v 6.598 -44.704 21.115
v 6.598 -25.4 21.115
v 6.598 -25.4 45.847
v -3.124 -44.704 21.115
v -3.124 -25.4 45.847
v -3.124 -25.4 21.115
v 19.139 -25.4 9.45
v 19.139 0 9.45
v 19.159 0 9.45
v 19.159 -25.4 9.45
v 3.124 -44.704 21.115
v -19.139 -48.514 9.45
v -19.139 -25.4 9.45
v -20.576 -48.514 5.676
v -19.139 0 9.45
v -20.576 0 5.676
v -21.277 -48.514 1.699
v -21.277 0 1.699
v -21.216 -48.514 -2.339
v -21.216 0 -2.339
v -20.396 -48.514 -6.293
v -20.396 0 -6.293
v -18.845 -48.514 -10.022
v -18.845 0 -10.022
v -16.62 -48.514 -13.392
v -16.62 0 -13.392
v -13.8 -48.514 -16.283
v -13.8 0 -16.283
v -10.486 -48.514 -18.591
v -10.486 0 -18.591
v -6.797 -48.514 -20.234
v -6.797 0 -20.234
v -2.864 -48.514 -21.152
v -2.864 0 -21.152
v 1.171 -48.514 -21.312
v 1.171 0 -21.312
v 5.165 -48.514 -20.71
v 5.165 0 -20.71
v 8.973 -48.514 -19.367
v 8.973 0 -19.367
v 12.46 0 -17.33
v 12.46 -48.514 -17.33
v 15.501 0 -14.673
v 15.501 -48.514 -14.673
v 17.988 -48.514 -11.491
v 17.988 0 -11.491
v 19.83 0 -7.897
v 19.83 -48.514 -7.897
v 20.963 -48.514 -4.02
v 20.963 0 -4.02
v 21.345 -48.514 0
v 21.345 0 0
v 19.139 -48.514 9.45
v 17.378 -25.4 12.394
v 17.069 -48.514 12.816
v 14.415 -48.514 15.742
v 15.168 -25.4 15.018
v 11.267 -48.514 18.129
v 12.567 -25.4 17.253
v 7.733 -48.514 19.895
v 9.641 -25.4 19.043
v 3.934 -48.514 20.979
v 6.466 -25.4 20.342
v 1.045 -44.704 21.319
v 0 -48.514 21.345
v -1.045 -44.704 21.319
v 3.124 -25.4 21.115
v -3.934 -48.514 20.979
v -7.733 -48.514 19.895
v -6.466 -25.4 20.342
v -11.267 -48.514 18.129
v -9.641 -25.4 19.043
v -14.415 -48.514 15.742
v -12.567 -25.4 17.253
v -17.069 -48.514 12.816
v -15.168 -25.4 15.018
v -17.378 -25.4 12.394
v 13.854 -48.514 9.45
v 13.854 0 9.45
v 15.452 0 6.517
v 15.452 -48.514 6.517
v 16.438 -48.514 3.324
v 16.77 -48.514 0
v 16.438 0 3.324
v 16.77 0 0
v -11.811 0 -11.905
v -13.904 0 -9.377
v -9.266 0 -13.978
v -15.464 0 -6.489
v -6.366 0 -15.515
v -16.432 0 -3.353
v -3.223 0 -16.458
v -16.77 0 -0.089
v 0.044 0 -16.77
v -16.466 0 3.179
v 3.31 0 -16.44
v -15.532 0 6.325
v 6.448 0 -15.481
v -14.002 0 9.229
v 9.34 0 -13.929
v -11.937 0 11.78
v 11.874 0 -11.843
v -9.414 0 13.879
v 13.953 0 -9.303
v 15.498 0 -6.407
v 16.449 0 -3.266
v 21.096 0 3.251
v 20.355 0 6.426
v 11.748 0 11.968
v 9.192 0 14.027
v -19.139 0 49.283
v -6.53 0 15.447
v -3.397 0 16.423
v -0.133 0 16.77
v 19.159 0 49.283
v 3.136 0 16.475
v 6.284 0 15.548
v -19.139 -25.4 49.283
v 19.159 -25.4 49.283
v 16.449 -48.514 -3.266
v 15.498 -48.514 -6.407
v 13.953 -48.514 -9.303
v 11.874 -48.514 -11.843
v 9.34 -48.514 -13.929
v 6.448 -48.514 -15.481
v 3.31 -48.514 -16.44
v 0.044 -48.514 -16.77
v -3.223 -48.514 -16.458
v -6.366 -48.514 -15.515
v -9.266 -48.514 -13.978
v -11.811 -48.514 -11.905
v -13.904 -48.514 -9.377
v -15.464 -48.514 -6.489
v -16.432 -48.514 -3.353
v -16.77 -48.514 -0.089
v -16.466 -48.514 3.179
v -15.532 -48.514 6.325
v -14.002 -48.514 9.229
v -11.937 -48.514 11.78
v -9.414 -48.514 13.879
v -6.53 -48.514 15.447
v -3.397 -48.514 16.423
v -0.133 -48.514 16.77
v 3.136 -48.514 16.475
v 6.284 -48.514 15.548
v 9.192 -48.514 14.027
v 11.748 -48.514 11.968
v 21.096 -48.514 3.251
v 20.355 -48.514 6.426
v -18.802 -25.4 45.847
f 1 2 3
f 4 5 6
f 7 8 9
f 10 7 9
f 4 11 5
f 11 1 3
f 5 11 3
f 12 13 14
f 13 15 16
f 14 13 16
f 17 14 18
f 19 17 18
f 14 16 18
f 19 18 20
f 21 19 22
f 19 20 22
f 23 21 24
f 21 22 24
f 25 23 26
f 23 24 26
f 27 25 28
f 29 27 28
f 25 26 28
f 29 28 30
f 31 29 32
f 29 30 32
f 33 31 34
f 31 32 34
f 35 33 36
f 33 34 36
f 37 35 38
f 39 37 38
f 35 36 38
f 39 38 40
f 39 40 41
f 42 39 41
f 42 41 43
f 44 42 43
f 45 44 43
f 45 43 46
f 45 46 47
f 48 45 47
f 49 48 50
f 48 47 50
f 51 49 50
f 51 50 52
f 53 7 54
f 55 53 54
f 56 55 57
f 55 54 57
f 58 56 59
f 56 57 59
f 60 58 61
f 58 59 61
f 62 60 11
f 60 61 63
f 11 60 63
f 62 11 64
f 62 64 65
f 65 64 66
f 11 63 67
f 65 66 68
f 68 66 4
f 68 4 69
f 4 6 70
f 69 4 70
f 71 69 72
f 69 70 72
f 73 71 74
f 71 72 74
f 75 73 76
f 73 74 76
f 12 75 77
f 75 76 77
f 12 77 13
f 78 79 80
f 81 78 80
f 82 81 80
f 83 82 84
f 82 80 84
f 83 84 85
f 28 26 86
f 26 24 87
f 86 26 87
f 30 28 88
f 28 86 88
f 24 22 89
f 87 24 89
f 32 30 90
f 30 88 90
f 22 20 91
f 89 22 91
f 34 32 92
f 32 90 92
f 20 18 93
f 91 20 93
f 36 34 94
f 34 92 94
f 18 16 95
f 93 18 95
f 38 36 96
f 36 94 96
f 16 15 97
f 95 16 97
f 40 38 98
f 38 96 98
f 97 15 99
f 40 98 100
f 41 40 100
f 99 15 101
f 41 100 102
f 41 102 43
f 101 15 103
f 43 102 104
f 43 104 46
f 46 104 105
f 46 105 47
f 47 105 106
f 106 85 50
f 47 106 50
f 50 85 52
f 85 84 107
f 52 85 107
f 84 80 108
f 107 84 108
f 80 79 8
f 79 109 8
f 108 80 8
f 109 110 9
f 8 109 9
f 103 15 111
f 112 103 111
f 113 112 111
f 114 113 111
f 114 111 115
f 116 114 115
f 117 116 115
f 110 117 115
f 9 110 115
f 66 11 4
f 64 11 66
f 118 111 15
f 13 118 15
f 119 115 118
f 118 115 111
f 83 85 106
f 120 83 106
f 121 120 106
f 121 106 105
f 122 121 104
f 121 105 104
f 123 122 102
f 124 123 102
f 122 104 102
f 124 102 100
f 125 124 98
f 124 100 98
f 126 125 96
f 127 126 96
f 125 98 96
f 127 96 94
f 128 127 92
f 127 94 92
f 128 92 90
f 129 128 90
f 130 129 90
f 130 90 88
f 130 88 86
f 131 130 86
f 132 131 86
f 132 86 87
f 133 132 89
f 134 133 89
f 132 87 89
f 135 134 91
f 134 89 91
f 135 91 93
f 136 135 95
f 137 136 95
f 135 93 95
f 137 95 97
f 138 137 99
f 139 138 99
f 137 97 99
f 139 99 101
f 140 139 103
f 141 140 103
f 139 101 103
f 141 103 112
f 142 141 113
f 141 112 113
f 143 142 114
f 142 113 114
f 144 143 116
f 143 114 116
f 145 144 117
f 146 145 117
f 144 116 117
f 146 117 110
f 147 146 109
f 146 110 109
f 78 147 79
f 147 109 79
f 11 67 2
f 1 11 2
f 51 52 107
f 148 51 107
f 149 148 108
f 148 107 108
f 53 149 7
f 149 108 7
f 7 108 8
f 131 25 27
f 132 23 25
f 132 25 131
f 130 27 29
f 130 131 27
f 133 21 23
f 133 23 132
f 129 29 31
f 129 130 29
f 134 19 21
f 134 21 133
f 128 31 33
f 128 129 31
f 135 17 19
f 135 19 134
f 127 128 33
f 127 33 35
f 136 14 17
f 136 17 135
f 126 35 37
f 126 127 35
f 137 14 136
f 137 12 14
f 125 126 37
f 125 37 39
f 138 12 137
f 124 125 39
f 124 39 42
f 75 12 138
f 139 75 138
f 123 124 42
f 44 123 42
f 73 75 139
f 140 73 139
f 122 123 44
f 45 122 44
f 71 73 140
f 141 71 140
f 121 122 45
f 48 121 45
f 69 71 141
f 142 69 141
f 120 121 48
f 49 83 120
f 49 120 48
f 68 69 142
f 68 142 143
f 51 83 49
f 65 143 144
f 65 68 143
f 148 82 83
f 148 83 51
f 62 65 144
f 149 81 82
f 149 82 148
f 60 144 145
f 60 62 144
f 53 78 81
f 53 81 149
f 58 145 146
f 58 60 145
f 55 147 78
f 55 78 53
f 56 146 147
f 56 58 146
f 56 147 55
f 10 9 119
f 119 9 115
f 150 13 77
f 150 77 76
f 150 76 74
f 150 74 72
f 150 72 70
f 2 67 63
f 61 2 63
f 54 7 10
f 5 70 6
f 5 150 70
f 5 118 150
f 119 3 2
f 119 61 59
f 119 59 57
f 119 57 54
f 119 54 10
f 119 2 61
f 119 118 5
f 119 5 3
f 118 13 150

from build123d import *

# Parameters (mm, degrees)
F1_DEPTH = 25.4
F2_DEPTH = 48.514
F4_DEPTH = 19.304
F6_DEPTH = 25.4


with BuildPart() as f1:
    # F0 (on Front) → F1 (new body)
    with BuildSketch(Plane.XZ):
        with BuildLine():
            Line((-19.1385153821, 49.2832697928), (-19.1385153821, 9.4504378209))
            ThreePointArc((-19.1385153821, 9.4504378209), (0, 21.3446374071), (19.1385153821, 9.4504378209))
            Line((19.1385153821, 9.4504378209), (19.1590227187, 9.4504378209))
            Line((19.1590227187, 9.4504378209), (19.1590227187, 49.2832697928))
            Line((19.1590227187, 49.2832697928), (-19.1385153821, 49.2832697928))
        make_face()
    extrude(amount=F1_DEPTH)

    # F0 (on Front) → F2 (join)
    with BuildSketch(Plane.XZ):
        with BuildLine():
            ThreePointArc((19.1385153821, 9.4504378209), (0, 21.3446374071), (-19.1385153821, 9.4504378209))
            Line((-19.1385153821, 9.4504378209), (-13.8539659138, 9.4504378209))
            ThreePointArc((-13.8539659138, 9.4504378209), (0, 16.7703054995), (13.8539659138, 9.4504378209))
            Line((13.8539659138, 9.4504378209), (19.1385153821, 9.4504378209))
        make_face()
        with BuildLine():
            Line((-13.8539659138, 9.4504378209), (-19.1385153821, 9.4504378209))
            ThreePointArc((-19.1385153821, 9.4504378209), (-4.8522610553, -20.7857910287), (21.3446374071, 0))
            ThreePointArc((21.3446374071, 0), (20.7857910287, 4.8522610553), (19.1385153821, 9.4504378209))
            Line((19.1385153821, 9.4504378209), (13.8539659138, 9.4504378209))
            ThreePointArc((13.8539659138, 9.4504378209), (16.0246433237, 4.9450938208), (16.7703054995, 0))
            ThreePointArc((16.7703054995, 0), (-4.9450938208, -16.0246433237), (-13.8539659138, 9.4504378209))
        make_face()
    extrude(amount=F2_DEPTH)

    # F3 (on face) → F4 (join)
    with BuildSketch(Plane.XZ.offset(25.4)):
        with BuildLine():
            Line((-3.1239633907, 45.8474755287), (-3.1239633907, 21.1147909952))
            ThreePointArc((-3.1239633907, 21.1147909952), (0, 21.3446374071), (3.1239633907, 21.1147909952))
            Line((3.1239633907, 21.1147909952), (6.5980968066, 21.1147909952))
            Line((6.5980968066, 21.1147909952), (6.5980968066, 45.8474755287))
            Line((6.5980968066, 45.8474755287), (-3.1239633907, 45.8474755287))
        make_face()
    extrude(amount=F4_DEPTH)

    # F5 (on face) → F6 (cut)
    with BuildSketch(Plane.YZ.offset(6.5980968066)):
        Polygon((-44.704, 45.8474755287), (-44.704, 21.1147909952), (-25.4, 45.8474755287), align=None)
    extrude(amount=-F6_DEPTH, mode=Mode.SUBTRACT)


solid = f1.part
